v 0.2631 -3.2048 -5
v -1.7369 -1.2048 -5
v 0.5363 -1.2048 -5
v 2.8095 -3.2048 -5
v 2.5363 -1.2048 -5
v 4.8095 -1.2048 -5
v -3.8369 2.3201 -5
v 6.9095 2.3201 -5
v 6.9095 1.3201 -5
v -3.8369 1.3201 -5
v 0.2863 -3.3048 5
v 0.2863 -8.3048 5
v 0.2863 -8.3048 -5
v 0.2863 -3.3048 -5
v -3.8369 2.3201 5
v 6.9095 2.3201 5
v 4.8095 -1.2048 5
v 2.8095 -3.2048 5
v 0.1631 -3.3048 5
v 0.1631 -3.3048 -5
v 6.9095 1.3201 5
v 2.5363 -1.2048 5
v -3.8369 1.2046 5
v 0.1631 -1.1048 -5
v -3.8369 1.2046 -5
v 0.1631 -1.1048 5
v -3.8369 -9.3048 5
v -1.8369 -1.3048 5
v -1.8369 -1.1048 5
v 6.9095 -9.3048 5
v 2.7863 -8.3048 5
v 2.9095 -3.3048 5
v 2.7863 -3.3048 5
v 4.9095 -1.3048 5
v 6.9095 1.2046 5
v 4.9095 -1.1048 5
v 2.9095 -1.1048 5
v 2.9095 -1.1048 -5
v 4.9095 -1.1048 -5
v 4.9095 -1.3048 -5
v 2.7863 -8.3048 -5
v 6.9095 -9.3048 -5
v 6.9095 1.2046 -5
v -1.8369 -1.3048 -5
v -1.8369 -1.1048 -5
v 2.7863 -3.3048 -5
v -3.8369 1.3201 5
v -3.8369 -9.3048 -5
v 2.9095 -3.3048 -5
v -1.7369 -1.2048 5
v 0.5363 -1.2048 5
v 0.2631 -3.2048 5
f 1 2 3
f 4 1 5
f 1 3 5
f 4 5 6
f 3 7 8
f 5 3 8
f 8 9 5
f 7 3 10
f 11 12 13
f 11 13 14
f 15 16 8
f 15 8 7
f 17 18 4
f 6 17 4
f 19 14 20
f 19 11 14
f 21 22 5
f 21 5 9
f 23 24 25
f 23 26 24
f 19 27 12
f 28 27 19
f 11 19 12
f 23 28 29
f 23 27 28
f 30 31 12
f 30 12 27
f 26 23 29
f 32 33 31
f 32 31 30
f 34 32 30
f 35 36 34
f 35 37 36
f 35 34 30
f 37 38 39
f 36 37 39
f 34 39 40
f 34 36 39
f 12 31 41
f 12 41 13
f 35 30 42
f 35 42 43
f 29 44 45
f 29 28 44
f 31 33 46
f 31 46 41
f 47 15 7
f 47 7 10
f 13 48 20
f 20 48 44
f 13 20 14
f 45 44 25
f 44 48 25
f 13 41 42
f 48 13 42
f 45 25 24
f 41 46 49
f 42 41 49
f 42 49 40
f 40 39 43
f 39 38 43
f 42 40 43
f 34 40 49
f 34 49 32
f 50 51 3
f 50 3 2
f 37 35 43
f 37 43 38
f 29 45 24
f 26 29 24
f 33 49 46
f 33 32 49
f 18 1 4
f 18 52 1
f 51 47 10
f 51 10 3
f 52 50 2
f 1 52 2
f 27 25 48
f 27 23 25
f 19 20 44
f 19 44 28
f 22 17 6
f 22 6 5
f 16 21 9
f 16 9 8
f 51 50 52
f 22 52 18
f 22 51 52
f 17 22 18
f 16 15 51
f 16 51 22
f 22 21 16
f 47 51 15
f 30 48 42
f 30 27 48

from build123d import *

# Parameters (mm, degrees)
F1_DEPTH  = 5
F2_SIZE   = 1.99999
F2_2_SIZE = 1.99999


# Not quite as in the source:
# - a fillet or chamfer is up to 0.001 mm smaller than in the source, because OpenCascade refuses the exact size


with BuildPart() as f1:
    # F0 (on Top) → F1 (new body, symmetric)
    with BuildSketch(Plane.XY):
        Polygon((-3.8368740493, -3.3047820088), (-3.8368740493, -9.3047820088), (6.9095361123, -9.3047820088), (6.9095361123, -3.3047820088), (4.9095361123, -3.3047820088), (2.7863310315, -3.3047820088), (2.7863310315, -8.3047820088), (0.2863310315, -8.3047820088), (0.2863310315, -3.3047820088), (-1.8368740493, -3.3047820088), align=None)
        Polygon((4.9095361123, -3.3047820088), (6.9095361123, -3.3047820088), (6.9095361123, 1.204619068), (2.9095361123, -1.1047820088), (4.9095361123, -1.1047820088), align=None)
        Polygon((-3.8368740493, 1.204619068), (-3.8368740493, -3.3047820088), (-1.8368740493, -3.3047820088), (-1.8368740493, -1.1047820088), (0.1631259507, -1.1047820088), align=None)
    extrude(amount=F1_DEPTH, both=True)

    # F2 (size 2 in the source; OpenCascade refuses exactly that, so slightly less here)
    f2_edges = [f1.edges().sort_by_distance(p)[0] for p in [
        (4.909536, -3.304782, 0),
        (-1.836874, -3.304782, 0),
    ]]
    chamfer(f2_edges, length=F2_SIZE)


with BuildPart() as f1b:
    # F0 (on Top) → F1, piece 2 (new body, symmetric)
    with BuildSketch(Plane.XY):
        Polygon((4.8095361123, -3.2047820088), (4.8095361123, -1.2047820088), (2.5363310315, -1.2047820088), (6.9095361123, 1.3200891218), (6.9095361123, 2.3200891218), (1.5363310315, 2.3200891218), (-3.8368740493, 2.3200891218), (-3.8368740493, 1.3200891218), (0.5363310315, -1.2047820088), (-1.7368740493, -1.2047820088), (-1.7368740493, -3.2047820088), (1.5363310315, -3.2047820088), align=None)
    extrude(amount=F1_DEPTH, both=True)

    # F2#2 (size 2 in the source; OpenCascade refuses exactly that, so slightly less here)
    f2_2_edges = [f1b.edges().sort_by_distance(p)[0] for p in [
        (4.809536, -3.204782, 0),
        (-1.736874, -3.204782, 0),
    ]]
    chamfer(f2_2_edges, length=F2_2_SIZE)


solid = Compound([f1.part, f1b.part])
